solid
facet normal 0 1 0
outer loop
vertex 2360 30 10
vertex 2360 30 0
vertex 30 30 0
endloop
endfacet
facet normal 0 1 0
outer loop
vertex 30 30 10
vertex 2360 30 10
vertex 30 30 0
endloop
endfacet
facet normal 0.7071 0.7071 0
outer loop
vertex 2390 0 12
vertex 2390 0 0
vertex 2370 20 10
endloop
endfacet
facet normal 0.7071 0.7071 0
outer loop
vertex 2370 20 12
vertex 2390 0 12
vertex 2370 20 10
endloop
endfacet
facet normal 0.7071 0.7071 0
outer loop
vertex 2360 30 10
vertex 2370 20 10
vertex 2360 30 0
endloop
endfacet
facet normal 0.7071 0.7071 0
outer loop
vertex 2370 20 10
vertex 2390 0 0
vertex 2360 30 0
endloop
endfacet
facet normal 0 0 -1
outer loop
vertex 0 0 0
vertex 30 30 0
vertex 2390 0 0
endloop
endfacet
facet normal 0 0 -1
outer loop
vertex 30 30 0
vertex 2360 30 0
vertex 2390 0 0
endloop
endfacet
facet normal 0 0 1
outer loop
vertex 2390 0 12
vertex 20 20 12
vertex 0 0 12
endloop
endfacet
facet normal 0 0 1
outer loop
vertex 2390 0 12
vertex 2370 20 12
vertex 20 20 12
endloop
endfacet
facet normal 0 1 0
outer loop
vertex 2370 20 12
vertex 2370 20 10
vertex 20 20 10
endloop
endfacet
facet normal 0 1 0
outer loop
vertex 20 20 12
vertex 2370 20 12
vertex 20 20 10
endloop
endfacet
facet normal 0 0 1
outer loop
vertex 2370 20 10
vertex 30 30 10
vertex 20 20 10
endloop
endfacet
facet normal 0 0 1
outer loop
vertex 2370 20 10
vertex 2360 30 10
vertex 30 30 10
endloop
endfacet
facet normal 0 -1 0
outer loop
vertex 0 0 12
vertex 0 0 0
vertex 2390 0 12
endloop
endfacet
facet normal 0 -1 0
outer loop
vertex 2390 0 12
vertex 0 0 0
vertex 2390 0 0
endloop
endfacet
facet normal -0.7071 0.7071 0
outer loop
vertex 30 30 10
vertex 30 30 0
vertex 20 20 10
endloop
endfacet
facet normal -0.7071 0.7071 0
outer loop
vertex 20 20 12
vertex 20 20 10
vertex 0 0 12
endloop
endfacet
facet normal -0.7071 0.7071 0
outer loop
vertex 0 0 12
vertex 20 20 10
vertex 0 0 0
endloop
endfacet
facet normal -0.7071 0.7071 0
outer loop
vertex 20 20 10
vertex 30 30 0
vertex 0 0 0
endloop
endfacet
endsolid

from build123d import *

# Parameters (mm, degrees)
F1_DEPTH = 12
F2_DEPTH = 10


with BuildPart() as f1:
    # F0 (on Top) → F1 (new body)
    with BuildSketch(Plane.XY):
        Polygon((20, 20), (0, 0), (2390, 0), (2370, 20), align=None)
    extrude(amount=F1_DEPTH)

    # F0 (on Top) → F2 (join)
    with BuildSketch(Plane.XY):
        Polygon((30, 30), (20, 20), (2370, 20), (2360, 30), align=None)
    extrude(amount=F2_DEPTH)


with BuildPart() as f3_1:
    # F3: copy of F1
    add(f1.part)


solid = f1.part
